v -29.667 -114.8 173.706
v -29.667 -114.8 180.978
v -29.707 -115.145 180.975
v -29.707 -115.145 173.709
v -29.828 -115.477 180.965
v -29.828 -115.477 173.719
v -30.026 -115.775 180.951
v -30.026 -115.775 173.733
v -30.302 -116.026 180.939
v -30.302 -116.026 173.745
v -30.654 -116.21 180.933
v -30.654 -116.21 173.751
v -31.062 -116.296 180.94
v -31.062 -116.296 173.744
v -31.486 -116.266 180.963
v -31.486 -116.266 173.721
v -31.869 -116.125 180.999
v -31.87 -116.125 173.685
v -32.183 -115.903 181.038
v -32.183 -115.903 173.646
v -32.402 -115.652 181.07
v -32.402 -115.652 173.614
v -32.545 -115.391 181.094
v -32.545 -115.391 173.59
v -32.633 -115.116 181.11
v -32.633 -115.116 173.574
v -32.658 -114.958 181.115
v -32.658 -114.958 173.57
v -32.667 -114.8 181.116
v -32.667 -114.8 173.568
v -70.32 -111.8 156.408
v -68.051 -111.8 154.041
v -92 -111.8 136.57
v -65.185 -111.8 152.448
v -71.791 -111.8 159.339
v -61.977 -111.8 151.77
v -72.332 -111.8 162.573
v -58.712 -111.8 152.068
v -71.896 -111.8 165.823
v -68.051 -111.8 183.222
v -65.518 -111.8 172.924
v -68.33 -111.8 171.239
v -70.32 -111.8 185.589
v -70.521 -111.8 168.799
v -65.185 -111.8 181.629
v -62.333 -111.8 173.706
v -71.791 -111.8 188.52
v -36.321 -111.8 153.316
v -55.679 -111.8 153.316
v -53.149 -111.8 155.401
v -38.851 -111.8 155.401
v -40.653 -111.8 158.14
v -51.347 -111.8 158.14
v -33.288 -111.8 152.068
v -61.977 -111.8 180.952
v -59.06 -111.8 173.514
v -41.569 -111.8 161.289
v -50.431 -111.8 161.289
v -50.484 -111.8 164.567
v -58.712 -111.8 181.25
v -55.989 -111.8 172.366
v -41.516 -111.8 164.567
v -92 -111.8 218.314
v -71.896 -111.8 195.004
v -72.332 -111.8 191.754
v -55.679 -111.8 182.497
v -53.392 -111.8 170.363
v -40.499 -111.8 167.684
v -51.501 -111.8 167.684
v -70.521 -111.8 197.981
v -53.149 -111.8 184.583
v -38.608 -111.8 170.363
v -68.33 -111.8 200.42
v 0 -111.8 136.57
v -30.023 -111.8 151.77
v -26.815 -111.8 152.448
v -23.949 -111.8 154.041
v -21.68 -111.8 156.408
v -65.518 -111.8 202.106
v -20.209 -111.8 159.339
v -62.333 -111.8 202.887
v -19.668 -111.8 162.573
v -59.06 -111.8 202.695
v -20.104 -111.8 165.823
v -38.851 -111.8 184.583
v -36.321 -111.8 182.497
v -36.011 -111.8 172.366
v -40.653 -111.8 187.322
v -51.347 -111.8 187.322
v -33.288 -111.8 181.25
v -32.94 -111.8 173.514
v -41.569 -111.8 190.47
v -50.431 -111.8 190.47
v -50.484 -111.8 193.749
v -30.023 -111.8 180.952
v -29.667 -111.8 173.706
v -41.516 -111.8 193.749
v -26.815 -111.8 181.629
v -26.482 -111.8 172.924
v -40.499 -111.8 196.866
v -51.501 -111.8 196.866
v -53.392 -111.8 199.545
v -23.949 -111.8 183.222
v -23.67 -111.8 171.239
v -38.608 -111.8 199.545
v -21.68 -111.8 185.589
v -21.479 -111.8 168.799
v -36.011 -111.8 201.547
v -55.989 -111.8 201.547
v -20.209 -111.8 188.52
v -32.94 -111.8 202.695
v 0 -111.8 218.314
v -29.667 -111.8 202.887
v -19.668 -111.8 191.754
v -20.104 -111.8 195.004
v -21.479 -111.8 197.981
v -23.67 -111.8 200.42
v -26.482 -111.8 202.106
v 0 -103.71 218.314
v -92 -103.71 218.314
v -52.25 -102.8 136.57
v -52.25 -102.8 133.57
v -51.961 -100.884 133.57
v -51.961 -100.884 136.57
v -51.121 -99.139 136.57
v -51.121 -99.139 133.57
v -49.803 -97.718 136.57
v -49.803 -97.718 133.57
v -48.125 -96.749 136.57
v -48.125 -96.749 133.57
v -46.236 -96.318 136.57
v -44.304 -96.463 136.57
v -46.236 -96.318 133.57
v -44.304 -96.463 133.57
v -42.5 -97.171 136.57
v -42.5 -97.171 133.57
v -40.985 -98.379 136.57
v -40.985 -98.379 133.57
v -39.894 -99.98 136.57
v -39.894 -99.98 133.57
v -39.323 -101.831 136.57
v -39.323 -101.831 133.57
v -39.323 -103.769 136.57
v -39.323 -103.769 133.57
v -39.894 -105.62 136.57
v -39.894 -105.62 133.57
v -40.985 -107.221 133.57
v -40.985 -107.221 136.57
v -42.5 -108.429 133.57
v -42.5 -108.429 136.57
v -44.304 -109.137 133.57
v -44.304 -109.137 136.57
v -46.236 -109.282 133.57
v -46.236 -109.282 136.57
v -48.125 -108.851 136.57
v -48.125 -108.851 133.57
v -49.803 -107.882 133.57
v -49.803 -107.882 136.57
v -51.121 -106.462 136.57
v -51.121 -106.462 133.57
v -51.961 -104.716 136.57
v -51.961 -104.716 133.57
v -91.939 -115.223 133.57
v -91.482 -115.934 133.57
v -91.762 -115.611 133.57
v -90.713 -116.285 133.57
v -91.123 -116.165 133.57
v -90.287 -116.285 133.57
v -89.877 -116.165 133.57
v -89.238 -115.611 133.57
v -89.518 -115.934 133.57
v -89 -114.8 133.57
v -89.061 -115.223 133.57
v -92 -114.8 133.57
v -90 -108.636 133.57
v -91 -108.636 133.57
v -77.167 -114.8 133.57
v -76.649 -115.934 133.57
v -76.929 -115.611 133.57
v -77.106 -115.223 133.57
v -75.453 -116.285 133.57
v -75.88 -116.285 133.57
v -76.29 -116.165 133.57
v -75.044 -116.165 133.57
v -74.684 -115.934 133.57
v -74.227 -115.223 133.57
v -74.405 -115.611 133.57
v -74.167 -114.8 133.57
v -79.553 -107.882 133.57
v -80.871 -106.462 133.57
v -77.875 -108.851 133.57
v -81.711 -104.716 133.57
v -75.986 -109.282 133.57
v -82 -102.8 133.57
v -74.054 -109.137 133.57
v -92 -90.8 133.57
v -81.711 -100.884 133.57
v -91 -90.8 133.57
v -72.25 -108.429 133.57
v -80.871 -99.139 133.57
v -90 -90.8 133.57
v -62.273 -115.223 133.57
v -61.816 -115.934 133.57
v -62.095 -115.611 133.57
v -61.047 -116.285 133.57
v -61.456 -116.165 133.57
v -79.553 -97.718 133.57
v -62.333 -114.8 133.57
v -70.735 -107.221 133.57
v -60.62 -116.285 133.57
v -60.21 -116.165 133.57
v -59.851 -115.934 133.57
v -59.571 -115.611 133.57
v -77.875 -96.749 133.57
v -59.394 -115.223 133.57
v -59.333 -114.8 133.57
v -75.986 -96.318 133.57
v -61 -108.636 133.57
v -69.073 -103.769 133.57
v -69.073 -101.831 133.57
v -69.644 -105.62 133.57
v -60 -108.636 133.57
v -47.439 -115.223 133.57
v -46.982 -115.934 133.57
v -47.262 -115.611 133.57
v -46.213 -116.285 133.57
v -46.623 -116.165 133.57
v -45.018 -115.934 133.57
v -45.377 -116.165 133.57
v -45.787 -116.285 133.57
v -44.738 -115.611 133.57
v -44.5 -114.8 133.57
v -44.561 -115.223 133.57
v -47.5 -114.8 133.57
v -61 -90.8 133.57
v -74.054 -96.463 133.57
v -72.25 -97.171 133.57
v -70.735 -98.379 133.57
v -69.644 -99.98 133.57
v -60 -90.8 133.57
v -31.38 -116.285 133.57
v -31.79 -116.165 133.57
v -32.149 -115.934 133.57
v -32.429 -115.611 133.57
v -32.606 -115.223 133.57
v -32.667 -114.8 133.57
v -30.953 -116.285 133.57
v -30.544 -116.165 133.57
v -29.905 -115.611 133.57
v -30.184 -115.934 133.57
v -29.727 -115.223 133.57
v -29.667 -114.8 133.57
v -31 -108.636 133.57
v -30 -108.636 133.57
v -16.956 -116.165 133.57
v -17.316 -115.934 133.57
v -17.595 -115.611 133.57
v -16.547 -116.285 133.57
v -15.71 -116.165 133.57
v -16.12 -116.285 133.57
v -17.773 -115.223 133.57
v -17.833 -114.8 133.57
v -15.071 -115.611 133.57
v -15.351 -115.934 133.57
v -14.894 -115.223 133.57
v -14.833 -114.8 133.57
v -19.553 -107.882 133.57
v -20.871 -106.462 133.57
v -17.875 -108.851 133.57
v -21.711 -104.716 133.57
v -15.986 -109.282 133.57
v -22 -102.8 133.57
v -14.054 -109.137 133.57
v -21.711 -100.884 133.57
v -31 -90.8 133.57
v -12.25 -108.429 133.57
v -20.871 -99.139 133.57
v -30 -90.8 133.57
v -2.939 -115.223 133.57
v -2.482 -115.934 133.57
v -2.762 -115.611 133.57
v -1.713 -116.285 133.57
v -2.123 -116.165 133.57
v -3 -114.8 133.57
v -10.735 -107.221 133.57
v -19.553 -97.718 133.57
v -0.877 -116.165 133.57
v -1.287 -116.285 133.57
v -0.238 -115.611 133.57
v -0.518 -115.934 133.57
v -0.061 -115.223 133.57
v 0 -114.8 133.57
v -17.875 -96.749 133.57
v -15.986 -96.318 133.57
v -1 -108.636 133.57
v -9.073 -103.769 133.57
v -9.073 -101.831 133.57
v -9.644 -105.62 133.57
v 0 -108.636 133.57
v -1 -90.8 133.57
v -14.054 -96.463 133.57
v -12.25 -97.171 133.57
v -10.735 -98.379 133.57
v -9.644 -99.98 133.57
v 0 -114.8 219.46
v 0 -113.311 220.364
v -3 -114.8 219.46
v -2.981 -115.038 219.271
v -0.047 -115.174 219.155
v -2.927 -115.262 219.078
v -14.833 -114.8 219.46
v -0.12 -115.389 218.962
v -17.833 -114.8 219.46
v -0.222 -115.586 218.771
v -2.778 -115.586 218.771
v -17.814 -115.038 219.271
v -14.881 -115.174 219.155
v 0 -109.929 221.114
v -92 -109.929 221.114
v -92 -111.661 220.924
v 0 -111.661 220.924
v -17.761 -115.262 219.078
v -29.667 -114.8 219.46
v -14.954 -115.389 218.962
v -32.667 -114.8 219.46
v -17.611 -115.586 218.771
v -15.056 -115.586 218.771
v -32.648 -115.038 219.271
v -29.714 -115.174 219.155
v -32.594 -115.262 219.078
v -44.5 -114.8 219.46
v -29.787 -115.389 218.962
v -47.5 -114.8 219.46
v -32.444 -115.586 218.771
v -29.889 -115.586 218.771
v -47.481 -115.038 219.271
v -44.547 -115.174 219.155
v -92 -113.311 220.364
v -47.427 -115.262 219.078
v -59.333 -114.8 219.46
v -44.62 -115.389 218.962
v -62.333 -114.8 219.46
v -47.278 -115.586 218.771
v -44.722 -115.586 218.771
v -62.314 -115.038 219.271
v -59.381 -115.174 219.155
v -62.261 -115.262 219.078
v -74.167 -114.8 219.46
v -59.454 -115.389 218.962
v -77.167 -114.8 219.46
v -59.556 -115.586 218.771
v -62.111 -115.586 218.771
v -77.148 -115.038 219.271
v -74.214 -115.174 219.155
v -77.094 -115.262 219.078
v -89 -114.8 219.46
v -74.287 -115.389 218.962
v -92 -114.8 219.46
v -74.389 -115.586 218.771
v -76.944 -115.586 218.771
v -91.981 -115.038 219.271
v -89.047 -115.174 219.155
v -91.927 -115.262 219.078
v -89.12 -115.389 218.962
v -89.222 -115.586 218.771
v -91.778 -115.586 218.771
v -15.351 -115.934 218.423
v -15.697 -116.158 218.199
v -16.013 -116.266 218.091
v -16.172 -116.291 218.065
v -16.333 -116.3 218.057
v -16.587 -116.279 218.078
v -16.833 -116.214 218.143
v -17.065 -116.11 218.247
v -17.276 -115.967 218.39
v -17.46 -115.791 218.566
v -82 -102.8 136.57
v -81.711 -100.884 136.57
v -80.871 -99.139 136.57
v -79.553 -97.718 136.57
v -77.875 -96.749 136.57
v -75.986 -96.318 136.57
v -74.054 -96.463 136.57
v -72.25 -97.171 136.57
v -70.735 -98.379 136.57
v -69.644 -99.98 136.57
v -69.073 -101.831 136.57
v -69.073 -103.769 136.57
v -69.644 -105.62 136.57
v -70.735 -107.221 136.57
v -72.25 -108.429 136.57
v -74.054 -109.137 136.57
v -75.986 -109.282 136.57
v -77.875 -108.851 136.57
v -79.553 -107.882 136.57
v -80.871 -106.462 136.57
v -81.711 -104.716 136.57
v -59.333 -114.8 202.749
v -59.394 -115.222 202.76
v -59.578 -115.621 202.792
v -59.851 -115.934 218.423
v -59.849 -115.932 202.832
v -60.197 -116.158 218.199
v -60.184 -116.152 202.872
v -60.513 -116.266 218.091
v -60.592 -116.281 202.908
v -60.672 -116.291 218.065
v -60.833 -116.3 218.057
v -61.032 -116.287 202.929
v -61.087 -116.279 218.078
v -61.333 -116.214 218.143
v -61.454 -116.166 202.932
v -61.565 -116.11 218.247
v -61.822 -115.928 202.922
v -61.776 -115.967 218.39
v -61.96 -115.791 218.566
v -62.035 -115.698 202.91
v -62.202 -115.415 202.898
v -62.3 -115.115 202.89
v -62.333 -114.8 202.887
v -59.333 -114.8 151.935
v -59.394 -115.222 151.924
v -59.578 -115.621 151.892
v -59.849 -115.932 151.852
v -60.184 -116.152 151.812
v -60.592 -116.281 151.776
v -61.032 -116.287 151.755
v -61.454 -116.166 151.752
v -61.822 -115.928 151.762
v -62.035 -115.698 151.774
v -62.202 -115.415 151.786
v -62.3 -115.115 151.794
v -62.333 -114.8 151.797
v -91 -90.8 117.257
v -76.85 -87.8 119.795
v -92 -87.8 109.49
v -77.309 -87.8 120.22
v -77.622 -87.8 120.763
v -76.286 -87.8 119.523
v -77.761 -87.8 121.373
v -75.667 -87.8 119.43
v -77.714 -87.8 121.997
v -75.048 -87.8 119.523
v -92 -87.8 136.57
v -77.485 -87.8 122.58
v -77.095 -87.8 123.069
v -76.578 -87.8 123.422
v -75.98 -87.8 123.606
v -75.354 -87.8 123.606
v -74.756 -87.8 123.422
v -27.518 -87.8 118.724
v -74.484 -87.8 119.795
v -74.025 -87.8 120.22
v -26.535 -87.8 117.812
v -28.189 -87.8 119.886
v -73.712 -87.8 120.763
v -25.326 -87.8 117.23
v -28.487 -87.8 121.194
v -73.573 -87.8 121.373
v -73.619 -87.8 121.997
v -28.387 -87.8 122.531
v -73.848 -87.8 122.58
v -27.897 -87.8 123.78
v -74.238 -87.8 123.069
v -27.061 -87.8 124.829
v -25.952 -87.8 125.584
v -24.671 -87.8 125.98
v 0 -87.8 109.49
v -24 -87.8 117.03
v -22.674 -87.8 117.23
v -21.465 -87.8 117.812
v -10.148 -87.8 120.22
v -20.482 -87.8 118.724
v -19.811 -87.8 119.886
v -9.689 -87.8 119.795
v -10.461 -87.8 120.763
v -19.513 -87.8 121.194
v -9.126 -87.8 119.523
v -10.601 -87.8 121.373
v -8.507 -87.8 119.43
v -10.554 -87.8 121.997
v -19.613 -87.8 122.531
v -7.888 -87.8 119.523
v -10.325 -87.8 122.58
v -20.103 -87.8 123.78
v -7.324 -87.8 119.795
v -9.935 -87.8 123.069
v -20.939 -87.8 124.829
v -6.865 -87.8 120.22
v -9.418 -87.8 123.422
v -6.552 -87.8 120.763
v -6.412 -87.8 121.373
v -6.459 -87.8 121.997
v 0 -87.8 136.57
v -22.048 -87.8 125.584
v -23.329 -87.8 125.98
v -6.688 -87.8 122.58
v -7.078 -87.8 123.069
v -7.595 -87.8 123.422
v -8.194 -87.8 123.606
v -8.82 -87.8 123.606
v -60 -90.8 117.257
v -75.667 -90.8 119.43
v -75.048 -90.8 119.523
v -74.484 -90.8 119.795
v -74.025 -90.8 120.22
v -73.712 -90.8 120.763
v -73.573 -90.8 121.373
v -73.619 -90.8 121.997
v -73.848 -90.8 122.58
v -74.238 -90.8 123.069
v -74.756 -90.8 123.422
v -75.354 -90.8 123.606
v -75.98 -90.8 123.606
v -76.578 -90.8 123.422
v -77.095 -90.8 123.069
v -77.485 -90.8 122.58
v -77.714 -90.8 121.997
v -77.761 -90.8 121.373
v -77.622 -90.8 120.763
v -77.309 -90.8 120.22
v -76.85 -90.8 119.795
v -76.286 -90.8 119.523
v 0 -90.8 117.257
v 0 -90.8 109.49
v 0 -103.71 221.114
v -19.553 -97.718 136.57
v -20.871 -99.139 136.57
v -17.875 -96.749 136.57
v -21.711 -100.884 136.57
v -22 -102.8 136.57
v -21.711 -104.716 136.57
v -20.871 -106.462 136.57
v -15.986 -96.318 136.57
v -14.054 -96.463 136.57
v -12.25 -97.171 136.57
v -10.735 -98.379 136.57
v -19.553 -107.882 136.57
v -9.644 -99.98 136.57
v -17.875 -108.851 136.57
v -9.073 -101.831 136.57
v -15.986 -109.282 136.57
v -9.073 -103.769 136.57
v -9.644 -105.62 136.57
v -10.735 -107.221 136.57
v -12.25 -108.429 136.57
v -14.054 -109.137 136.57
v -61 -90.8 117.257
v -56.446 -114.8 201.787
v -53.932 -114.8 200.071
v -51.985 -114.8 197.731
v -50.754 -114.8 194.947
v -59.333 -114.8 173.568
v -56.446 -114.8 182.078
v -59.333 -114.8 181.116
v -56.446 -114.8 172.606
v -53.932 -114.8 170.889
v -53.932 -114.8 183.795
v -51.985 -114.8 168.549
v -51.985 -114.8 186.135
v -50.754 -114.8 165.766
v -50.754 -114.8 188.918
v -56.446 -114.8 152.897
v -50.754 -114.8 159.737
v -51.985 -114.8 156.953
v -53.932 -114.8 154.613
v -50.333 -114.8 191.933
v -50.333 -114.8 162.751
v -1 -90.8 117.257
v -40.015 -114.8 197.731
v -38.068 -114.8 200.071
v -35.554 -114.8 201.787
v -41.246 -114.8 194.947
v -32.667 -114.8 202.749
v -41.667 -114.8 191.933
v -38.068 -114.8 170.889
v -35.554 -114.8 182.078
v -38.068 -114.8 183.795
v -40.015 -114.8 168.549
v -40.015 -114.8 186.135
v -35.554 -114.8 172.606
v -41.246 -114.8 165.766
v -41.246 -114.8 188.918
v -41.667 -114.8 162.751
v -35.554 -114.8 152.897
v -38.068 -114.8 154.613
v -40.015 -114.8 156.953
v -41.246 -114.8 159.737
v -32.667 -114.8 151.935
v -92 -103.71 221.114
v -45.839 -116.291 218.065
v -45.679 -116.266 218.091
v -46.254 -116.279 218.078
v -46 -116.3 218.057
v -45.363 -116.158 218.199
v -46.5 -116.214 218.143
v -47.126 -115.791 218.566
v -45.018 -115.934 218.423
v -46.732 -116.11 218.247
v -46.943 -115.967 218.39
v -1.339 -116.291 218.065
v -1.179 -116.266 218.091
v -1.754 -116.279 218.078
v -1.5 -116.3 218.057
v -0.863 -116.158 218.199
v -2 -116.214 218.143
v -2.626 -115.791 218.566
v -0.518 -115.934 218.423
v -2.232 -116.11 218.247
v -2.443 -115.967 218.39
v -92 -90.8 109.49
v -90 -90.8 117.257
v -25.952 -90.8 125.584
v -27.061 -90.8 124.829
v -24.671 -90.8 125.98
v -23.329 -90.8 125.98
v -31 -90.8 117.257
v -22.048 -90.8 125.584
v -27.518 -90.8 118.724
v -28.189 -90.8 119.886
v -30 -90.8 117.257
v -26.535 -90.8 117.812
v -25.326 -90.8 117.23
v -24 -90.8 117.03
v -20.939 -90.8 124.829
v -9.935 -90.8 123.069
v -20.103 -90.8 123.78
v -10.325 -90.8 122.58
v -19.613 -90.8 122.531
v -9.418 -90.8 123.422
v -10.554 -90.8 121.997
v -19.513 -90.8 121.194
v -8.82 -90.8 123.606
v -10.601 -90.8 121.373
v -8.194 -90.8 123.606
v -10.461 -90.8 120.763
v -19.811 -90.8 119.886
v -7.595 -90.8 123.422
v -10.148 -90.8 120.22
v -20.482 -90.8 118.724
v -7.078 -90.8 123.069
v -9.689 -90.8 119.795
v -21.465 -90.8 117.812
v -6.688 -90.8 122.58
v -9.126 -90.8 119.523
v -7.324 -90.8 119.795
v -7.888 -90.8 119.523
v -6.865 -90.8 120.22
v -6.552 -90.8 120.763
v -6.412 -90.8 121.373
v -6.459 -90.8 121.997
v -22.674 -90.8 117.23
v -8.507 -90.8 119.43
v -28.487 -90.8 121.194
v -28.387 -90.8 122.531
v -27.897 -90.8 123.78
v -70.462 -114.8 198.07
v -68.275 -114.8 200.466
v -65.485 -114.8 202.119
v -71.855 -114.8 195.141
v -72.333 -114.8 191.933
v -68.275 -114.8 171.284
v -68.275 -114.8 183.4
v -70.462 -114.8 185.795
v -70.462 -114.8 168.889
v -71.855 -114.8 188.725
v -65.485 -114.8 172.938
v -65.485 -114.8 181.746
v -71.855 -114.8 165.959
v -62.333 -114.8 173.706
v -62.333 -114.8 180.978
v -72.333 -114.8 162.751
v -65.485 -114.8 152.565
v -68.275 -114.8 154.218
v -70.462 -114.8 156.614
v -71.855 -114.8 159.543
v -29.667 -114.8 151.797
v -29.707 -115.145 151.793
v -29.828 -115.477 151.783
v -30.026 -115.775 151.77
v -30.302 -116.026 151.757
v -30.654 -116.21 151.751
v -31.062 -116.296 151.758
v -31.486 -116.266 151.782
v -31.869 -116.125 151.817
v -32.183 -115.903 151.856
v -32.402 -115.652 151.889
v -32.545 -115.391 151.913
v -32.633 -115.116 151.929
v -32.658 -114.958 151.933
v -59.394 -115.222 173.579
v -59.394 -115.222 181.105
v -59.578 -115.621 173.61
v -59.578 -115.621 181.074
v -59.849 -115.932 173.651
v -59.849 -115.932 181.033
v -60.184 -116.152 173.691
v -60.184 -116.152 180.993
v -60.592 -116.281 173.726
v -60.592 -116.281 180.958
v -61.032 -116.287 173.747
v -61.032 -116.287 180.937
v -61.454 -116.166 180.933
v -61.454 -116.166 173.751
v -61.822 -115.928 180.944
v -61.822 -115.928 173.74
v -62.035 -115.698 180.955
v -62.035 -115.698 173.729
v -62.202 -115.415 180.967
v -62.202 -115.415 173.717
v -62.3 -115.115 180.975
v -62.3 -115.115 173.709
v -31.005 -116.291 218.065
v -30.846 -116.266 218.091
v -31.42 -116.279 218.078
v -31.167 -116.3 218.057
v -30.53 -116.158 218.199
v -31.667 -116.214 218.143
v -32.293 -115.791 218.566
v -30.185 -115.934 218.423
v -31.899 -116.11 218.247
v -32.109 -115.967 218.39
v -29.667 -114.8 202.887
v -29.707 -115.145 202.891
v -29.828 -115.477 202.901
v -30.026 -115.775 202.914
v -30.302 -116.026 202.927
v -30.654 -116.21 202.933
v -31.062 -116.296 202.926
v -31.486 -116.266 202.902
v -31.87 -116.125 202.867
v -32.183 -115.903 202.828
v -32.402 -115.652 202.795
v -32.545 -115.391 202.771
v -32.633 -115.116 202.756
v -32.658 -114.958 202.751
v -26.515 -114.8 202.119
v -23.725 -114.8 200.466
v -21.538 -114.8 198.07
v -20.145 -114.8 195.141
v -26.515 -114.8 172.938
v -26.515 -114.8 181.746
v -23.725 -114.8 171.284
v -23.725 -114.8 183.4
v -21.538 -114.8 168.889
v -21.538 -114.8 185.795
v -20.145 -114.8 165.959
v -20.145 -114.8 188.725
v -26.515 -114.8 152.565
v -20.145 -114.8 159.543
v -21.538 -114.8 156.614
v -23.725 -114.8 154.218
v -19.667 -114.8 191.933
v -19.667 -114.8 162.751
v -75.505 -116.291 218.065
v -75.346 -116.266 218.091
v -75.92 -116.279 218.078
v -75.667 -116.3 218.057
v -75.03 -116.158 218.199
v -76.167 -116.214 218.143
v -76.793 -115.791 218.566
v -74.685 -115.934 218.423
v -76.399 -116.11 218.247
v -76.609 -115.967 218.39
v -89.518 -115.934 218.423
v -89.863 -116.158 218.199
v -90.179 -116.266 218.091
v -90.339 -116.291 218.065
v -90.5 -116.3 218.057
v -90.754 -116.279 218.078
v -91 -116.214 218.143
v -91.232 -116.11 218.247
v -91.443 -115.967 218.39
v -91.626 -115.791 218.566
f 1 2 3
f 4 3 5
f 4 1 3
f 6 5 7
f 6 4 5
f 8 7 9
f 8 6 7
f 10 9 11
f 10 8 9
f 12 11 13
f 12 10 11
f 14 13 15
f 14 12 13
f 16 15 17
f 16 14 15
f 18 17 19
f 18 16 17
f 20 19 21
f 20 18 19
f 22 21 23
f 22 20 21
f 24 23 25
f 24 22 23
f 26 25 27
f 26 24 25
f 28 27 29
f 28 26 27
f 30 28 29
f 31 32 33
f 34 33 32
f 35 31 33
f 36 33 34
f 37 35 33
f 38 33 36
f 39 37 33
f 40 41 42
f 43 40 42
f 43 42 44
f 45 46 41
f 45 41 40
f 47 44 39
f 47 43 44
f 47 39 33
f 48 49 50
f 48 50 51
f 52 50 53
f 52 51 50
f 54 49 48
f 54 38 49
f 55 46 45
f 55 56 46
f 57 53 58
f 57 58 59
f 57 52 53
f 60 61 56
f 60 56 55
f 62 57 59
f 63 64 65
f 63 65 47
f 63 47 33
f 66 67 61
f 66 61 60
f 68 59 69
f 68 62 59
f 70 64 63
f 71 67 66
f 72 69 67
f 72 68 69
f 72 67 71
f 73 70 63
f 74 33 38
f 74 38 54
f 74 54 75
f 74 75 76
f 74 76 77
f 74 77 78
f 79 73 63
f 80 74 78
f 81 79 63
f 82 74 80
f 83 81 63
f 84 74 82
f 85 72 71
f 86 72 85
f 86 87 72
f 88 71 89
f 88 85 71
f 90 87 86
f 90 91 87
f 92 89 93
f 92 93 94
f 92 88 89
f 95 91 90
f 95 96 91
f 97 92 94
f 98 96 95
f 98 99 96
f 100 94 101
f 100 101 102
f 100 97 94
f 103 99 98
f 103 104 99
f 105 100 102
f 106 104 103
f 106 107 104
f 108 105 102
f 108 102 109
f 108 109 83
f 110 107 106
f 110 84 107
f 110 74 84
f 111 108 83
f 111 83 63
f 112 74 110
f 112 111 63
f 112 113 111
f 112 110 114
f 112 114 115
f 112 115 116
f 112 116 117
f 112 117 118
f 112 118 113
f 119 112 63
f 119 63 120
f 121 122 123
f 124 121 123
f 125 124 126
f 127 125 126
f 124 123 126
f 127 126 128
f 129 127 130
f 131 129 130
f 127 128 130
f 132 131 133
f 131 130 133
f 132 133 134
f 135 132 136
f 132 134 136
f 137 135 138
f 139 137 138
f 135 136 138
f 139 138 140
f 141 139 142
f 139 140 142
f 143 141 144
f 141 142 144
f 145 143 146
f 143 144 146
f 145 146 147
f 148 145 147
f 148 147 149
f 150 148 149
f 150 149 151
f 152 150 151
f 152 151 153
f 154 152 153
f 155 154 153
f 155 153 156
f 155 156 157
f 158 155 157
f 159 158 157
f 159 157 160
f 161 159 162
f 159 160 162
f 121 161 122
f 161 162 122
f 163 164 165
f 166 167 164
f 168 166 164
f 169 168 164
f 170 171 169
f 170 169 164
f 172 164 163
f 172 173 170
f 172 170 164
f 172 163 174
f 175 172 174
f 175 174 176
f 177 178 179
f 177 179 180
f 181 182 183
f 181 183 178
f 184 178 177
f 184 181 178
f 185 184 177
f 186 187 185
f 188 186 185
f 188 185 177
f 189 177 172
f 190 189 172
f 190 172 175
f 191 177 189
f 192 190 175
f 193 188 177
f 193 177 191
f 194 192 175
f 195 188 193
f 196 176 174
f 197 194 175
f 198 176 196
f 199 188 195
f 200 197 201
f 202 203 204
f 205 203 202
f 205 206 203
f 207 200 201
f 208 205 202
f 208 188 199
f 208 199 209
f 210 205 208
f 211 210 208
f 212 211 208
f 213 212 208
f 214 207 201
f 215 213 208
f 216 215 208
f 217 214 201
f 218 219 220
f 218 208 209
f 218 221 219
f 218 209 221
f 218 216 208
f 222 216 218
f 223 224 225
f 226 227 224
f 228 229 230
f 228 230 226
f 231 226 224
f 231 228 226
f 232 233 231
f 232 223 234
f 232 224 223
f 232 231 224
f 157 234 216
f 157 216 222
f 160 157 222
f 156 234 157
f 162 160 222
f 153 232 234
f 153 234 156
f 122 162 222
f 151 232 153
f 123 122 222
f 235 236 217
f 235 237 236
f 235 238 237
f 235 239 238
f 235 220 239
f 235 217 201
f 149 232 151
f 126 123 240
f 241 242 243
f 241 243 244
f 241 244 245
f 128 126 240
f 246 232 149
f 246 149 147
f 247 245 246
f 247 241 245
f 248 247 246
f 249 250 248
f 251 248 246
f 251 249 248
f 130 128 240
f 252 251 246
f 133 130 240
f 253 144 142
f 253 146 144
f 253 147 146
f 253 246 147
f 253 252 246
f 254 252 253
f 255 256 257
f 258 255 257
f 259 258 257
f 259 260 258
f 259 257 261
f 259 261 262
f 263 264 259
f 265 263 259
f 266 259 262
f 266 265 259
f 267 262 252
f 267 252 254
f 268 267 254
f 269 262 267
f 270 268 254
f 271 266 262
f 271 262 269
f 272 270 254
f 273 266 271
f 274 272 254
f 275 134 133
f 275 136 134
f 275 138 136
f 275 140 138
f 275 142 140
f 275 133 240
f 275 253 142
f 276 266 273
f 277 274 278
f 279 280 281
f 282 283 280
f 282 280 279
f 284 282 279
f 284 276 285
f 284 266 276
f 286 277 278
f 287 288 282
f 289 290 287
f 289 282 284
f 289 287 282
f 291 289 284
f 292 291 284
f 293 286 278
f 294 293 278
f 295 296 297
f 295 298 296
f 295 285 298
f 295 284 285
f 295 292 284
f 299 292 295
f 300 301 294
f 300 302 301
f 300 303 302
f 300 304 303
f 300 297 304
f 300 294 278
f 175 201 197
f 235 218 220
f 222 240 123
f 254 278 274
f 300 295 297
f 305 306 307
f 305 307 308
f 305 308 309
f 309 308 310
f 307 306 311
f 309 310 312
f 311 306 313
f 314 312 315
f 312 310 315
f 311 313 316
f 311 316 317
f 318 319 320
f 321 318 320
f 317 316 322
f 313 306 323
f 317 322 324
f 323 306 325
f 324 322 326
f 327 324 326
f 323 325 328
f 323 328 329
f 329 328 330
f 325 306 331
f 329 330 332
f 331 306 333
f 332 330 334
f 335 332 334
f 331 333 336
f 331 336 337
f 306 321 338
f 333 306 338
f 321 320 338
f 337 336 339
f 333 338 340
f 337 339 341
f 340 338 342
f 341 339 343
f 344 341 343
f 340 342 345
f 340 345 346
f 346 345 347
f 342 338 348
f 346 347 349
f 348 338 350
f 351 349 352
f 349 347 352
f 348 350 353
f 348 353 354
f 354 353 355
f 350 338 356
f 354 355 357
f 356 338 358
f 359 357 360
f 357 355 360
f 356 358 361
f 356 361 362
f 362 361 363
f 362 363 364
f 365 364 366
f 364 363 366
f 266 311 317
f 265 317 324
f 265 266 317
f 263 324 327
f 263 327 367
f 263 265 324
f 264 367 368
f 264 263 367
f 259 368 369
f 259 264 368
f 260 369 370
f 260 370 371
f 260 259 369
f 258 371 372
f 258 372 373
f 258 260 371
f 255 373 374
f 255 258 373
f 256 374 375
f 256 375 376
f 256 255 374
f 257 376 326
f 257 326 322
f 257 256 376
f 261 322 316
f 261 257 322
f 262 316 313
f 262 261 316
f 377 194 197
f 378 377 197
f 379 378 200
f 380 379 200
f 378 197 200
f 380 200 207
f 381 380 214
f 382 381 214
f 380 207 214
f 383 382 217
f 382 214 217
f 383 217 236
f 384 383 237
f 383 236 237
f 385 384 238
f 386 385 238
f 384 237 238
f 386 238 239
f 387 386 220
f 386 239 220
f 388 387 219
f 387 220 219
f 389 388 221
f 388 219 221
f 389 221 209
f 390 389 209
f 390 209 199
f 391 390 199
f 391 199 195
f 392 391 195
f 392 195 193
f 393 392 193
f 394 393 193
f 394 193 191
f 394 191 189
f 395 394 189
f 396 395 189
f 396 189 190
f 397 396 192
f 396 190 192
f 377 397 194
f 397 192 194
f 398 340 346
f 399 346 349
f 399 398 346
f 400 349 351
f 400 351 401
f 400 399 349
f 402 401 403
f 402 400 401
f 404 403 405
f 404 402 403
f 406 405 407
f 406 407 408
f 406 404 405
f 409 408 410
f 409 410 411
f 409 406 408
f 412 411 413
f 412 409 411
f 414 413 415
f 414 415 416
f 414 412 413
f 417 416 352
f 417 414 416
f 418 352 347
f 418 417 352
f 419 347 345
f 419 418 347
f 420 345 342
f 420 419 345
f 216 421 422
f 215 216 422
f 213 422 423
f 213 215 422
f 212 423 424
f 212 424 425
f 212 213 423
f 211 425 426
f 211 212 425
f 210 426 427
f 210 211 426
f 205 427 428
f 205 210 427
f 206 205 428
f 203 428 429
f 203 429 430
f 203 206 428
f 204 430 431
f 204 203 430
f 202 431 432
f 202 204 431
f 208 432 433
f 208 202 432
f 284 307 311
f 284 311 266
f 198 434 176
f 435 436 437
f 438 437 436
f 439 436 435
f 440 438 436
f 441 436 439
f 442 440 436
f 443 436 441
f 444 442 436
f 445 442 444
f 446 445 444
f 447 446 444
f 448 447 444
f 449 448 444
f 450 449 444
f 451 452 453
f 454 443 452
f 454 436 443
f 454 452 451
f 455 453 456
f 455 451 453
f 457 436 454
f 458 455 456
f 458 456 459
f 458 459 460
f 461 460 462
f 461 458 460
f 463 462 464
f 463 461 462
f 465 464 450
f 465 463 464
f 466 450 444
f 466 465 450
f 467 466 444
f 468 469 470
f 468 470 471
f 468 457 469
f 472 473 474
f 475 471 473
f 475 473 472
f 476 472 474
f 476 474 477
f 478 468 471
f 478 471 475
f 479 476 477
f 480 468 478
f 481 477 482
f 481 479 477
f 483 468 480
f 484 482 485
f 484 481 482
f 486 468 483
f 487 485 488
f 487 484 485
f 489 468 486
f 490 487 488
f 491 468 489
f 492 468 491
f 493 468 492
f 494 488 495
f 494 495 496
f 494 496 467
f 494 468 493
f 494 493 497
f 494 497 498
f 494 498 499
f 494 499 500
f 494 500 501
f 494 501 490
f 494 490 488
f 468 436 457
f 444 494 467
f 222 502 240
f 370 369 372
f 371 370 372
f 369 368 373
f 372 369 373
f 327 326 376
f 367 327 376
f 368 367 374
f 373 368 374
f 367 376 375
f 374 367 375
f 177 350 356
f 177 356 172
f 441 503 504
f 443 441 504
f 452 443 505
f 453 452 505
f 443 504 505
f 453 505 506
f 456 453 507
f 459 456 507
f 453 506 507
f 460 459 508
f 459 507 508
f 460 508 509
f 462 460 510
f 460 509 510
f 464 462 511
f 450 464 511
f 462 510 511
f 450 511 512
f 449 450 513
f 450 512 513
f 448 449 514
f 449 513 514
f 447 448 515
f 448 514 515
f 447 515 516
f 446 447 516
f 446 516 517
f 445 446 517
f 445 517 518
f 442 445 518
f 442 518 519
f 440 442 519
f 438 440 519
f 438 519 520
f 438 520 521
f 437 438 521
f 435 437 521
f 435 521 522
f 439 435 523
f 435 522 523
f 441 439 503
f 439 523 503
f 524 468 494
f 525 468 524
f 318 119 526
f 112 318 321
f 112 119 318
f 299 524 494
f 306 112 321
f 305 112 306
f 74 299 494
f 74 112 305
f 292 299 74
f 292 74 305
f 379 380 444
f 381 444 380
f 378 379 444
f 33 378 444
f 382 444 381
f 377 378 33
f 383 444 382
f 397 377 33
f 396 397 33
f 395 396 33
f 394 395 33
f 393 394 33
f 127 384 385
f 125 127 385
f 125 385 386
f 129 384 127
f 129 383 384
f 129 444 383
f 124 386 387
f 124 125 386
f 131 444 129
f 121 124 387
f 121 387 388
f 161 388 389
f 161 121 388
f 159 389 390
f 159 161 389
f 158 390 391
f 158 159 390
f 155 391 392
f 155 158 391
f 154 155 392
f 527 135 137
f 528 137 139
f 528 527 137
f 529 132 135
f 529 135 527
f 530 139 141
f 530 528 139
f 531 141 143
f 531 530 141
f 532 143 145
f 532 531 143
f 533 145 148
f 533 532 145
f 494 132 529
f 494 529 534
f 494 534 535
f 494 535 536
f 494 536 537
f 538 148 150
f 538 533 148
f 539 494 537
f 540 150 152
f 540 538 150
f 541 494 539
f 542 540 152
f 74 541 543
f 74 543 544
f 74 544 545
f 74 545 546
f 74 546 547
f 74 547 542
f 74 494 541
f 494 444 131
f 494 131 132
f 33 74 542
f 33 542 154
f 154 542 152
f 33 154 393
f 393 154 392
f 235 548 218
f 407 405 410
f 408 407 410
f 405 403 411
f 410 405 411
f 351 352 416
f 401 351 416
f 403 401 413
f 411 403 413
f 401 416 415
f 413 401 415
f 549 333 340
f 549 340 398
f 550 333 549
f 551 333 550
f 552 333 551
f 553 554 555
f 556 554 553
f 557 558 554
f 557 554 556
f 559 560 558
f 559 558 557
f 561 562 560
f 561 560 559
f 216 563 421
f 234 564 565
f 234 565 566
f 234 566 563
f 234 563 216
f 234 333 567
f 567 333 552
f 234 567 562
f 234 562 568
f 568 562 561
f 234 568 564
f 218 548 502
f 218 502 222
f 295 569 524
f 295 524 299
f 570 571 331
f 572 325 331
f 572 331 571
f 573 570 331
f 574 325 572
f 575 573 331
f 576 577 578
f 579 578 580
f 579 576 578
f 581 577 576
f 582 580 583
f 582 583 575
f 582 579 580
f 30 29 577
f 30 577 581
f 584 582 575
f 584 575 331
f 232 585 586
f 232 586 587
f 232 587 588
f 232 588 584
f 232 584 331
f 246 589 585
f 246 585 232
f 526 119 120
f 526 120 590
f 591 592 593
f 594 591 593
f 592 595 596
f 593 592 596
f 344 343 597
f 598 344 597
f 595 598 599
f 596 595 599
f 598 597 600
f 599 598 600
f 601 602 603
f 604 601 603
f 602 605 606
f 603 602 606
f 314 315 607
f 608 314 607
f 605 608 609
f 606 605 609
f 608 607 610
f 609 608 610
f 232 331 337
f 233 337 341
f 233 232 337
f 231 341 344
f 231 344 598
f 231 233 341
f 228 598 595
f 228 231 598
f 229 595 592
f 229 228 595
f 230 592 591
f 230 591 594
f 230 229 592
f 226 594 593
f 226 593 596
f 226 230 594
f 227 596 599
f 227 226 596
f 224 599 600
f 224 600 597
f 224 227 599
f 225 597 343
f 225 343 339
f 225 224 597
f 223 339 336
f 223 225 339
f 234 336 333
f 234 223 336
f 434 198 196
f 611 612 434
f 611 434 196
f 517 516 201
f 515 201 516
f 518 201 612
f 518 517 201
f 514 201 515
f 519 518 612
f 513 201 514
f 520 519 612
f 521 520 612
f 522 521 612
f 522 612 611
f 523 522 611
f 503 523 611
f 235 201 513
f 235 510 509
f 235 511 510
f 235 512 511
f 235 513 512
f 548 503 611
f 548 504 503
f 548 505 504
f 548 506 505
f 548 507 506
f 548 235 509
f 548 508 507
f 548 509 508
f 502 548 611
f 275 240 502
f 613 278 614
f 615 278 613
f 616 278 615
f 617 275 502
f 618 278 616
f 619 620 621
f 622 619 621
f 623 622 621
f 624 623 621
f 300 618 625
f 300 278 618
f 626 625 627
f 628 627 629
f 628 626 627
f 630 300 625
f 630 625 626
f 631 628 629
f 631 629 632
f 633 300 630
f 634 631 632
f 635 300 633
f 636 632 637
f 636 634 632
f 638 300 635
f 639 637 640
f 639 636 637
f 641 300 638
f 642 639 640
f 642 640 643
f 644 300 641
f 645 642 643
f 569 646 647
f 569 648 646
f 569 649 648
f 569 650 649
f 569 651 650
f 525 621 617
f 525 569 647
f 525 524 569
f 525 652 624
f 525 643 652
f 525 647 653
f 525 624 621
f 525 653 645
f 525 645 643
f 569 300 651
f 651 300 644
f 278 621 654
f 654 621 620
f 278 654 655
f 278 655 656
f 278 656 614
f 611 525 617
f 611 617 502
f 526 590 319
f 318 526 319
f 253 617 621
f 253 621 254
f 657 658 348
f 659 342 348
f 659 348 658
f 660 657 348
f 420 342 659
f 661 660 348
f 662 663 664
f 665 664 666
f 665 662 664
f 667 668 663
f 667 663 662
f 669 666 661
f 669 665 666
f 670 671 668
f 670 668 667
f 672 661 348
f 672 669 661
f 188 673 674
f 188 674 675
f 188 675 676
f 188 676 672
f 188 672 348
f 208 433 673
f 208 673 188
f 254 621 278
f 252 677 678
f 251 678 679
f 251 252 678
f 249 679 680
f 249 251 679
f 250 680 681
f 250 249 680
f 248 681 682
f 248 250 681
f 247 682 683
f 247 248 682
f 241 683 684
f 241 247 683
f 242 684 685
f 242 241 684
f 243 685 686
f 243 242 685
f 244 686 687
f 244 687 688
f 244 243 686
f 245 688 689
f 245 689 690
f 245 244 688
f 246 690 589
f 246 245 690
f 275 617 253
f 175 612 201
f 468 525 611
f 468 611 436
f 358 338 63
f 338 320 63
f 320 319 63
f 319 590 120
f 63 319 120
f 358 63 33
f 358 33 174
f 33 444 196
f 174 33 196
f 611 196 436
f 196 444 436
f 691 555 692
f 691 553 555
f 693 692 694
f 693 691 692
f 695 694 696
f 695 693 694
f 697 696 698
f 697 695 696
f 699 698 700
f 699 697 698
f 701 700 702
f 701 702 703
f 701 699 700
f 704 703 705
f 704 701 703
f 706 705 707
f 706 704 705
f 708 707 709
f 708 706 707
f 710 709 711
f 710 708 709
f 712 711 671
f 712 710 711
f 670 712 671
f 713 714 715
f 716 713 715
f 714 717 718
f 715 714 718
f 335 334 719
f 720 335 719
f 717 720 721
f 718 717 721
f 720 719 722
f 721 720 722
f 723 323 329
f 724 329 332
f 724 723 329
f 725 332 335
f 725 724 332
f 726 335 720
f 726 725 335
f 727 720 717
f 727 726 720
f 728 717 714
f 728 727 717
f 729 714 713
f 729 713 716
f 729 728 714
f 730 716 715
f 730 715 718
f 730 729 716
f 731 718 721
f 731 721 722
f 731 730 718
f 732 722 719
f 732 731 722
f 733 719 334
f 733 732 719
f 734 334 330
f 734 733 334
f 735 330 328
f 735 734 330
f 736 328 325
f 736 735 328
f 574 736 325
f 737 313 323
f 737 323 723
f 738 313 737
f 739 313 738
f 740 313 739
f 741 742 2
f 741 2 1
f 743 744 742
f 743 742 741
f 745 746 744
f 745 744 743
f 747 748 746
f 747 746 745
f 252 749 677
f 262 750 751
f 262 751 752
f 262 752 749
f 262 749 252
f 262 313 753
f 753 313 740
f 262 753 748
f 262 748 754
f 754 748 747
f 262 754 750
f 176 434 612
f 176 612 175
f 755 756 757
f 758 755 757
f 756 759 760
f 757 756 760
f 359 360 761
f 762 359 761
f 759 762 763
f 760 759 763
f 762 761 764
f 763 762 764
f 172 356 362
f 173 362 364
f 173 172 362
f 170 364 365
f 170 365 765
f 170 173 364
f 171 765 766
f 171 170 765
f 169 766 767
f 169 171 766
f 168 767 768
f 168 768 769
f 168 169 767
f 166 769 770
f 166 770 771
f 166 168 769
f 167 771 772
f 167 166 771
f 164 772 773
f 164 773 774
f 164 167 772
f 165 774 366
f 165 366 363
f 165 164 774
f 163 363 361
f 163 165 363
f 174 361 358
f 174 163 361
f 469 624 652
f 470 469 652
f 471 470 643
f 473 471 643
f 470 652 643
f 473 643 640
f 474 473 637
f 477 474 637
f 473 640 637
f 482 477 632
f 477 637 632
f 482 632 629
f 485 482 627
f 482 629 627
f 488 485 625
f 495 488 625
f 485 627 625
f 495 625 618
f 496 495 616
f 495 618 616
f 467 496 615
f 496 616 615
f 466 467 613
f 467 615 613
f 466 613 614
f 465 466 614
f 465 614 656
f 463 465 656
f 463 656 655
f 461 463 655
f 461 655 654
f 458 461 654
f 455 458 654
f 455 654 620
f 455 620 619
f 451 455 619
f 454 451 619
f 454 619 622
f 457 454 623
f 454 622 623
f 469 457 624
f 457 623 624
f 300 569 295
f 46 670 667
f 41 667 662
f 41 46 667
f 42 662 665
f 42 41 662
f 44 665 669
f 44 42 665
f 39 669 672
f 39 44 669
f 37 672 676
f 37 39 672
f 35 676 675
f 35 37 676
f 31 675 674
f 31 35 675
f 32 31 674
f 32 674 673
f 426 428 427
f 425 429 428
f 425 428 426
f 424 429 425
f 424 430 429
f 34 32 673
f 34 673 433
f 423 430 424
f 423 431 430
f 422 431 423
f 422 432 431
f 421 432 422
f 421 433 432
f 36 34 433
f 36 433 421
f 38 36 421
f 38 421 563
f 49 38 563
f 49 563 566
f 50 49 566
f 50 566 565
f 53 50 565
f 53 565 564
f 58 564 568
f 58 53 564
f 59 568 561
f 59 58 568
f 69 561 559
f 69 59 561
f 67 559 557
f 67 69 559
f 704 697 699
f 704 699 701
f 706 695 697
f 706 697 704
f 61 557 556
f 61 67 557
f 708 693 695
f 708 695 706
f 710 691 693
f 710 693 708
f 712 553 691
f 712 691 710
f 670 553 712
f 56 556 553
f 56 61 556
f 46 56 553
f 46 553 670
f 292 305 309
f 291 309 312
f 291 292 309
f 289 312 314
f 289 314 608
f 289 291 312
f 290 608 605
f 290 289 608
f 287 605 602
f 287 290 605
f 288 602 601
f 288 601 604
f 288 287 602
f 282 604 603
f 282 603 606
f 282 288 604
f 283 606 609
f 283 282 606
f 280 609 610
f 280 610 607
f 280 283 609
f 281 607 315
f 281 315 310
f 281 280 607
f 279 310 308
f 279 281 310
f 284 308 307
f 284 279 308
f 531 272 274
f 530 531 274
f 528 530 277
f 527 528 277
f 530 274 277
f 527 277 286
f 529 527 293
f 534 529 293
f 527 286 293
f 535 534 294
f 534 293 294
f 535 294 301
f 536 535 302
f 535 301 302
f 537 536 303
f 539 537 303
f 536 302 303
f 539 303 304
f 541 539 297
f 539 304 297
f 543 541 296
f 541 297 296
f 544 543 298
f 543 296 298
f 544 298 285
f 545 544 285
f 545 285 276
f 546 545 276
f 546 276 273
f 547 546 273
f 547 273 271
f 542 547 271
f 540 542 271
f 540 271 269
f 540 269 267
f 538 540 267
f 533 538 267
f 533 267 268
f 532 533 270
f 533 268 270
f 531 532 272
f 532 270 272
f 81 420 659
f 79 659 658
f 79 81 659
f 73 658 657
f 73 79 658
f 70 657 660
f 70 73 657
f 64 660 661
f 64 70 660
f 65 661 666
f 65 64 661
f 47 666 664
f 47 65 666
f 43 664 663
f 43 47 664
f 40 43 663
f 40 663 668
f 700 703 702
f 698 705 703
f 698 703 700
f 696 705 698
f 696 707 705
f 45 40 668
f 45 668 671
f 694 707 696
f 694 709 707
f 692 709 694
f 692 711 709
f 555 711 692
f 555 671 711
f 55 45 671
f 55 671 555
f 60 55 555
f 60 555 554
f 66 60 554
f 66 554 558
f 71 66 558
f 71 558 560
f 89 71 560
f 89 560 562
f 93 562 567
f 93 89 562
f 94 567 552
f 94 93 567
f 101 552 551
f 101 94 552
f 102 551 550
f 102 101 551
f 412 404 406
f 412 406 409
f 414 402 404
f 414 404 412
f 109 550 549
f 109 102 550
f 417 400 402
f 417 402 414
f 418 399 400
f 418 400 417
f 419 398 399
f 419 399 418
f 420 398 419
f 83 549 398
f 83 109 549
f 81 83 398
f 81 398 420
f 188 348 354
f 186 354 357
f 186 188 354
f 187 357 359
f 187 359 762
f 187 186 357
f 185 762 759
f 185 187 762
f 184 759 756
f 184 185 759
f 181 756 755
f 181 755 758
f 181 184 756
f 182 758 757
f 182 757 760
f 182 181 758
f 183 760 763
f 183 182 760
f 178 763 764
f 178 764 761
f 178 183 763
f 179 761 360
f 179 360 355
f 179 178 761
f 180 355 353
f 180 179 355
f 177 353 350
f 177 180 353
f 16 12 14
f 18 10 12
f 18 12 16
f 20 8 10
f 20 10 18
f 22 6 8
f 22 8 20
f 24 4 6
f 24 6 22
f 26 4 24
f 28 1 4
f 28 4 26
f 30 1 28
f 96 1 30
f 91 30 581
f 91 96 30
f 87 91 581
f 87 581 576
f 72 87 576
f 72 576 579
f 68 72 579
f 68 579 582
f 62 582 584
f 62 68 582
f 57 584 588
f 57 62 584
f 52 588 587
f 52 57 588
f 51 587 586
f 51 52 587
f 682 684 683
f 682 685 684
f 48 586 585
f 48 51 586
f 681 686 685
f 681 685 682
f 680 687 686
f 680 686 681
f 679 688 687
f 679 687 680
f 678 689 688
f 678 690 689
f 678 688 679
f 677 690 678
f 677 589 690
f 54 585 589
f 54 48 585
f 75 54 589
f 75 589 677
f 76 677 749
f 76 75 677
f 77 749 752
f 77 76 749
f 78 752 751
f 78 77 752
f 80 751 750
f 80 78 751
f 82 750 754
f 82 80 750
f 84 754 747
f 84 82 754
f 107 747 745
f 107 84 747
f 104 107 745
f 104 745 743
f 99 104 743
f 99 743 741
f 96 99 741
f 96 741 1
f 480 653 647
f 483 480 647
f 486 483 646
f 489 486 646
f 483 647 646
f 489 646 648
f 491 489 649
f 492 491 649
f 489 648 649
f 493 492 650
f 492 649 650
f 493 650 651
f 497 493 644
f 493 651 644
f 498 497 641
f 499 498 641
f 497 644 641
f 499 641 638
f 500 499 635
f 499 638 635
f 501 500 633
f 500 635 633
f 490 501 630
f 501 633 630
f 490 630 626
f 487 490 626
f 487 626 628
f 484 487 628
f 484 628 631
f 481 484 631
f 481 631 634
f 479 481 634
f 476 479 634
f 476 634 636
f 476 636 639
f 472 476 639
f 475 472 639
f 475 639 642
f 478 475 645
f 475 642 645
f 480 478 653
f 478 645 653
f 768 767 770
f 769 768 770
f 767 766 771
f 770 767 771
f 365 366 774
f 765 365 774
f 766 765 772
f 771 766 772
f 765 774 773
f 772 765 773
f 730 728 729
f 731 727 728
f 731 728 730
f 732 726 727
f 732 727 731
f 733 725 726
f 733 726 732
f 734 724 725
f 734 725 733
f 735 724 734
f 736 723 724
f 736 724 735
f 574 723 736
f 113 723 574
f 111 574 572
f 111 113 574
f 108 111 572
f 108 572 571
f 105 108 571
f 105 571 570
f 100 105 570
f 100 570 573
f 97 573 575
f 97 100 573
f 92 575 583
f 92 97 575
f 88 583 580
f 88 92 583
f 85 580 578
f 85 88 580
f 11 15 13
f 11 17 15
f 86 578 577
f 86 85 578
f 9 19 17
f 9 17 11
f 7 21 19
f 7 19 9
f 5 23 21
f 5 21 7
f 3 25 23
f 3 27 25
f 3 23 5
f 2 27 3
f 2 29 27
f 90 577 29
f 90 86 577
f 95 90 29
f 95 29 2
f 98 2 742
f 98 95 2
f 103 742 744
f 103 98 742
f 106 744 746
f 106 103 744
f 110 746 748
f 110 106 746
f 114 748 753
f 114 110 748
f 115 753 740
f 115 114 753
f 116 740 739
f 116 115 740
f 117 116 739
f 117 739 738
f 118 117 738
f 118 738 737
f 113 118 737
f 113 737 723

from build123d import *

# Parameters (mm, degrees)
BOSS_EXTRU_1_DEPTH           = 92
NERVURE2_REACH               = 267.583
ESQUISSE3_WALL_W             = 557.337159988
ESQUISSE3_WALL_H             = 1
R_P_TITION_LIN_AIRE1_COUNT   = 4
R_P_TITION_LIN_AIRE1_PITCH   = 30
ESQUISSE4_R                  = 6.5
ENL_V_MAT_EXTRU_1_DEPTH      = 3
ESQUISSE6_R                  = 1.5
BOSS_EXTRU_2_DEPTH           = 87.544216856
R_P_TITION_LIN_AIRE2_COUNT   = 7
R_P_TITION_LIN_AIRE2_PITCH   = 14.833333333
ENL_V_MAT_EXTRU_2_DEPTH      = 3
ENL_V_MAT_EXTRU_2_DEPTH_BACK = 3
ESQUISSE5_R                  = 11
ENL_V_START                  = -92
ENL_V_MAT_EXTRU_3_DEPTH      = 92
CONG_1_R                     = 8
ESQUISSE9_R                  = 4.5
ENL_V_MAT_EXTRU_5_DEPTH      = 3
ESQUISSE8_R                  = 2.1
ENL_V_MAT_EXTRU_4_DEPTH      = 3


with BuildPart() as part:
    # Esquisse1 → Boss.-Extru.1 (new body)
    with BuildSketch(Plane(origin=(0, 0, 0), x_dir=(0, 0, -1), z_dir=(1, 0, 0))):
        Polygon((-109.489716306, -87.800176517), (-136.569905432, -87.800176517), (-136.569905432, -111.800176517), (-218.114122288, -111.800176517), (-218.314122288, -111.800176517), (-218.314122288, -103.710391053), (-221.114122288, -103.710391053), (-221.114122288, -114.800176517), (-133.569905432, -114.800176517), (-133.569905432, -90.800176517), (-109.489716306, -90.800176517), align=None)
    extrude(amount=-BOSS_EXTRU_1_DEPTH)

    # Esquisse3 wall → Nervure2 (add, up to next)
    with BuildSketch(Plane(origin=(0, -99.717919792, 125.413574296), x_dir=(0, -0.737906584765, 0.674902861278), z_dir=(0, -0.674902861278, -0.737906584765)), mode=Mode.PRIVATE) as nervure2_sk1:
        with Locations((0, 0.5)):
            Rectangle(ESQUISSE3_WALL_W, ESQUISSE3_WALL_H)
    nervure2_tool1 = extrude(nervure2_sk1.sketch, amount=-NERVURE2_REACH, mode=Mode.PRIVATE) - part.part
    nervure2 = nervure2_tool1.solids().sort_by_distance((0, -99.717919792, 125.413574296))[0]
    add(nervure2)

    # Répétition linéaire1: Nervure2 ×4
    with Locations(*[(-i * R_P_TITION_LIN_AIRE1_PITCH, 0, 0) for i in range(1, R_P_TITION_LIN_AIRE1_COUNT)]):
        add(nervure2)

    # Esquisse4 → Enlèv. mat.-Extru.1 (cut)
    with BuildSketch(Plane(origin=(0, 0, 133.569905432), x_dir=(-1, 0, 0), z_dir=(0, 0, -1))):
        with Locations((15.5, -102.800176517)):
            Circle(ESQUISSE4_R)
        with Locations((45.75, -102.800176517)):
            Circle(ESQUISSE4_R)
        with Locations((75.5, -102.800176517)):
            Circle(ESQUISSE4_R)
    extrude(amount=-ENL_V_MAT_EXTRU_1_DEPTH, mode=Mode.SUBTRACT)

    # Esquisse6 → Boss.-Extru.2 (add)
    with BuildSketch(Plane(origin=(0, 0, 133.569905432), x_dir=(-1, 0, 0), z_dir=(0, 0, -1))):
        with Locations((1.5, -114.800176517)):
            Circle(ESQUISSE6_R)
    boss_extru_2 = extrude(amount=-BOSS_EXTRU_2_DEPTH)

    # Répétition linéaire2: Boss.-Extru.2 ×7
    with Locations(*[(-i * R_P_TITION_LIN_AIRE2_PITCH, 0, 0) for i in range(1, R_P_TITION_LIN_AIRE2_COUNT)]):
        add(boss_extru_2)

    # Esquisse5 → Enlèv. mat.-Extru.2 (cut, two sides: drawn at the far end of the back side and taken through both)
    with BuildSketch(Plane(origin=(0, -114.800176517, 0), x_dir=(-1, 0, 0), z_dir=(0, -1, 0)).offset(-ENL_V_MAT_EXTRU_2_DEPTH_BACK)):
        with Locations(Location((30.666666667, -162.751311051, 0), (0, 0, 264.78409143))):
            Circle(ESQUISSE5_R)
        with Locations(Location((61.333333333, -162.751311051, 0), (0, 0, 275.21590857))):
            Circle(ESQUISSE5_R)
        with Locations(Location((61.333333333, -191.93271667, 0), (0, 0, 275.21590857))):
            Circle(ESQUISSE5_R)
        with Locations(Location((30.666666667, -191.93271667, 0), (0, 0, 264.78409143))):
            Circle(ESQUISSE5_R)
    extrude(amount=ENL_V_MAT_EXTRU_2_DEPTH + ENL_V_MAT_EXTRU_2_DEPTH_BACK, mode=Mode.SUBTRACT)

    # Esquisse7 → Enlèv. mat.-Extru.3 (cut)
    with BuildSketch(Plane(origin=(0, 0, 0), x_dir=(0, 0, -1), z_dir=(1, 0, 0)).offset(ENL_V_START)):
        Polygon((-221.114122288, -113.242817204), (-218.056762976, -116.300176517), (-221.114122288, -116.300176517), align=None)
    extrude(amount=ENL_V_MAT_EXTRU_3_DEPTH, mode=Mode.SUBTRACT)

    # Congé1
    # the kernel refuses this fillet: 8 mm, written as the material it takes off along each edge
    with BuildSketch(Plane(origin=(-100.284271247, -113.242817204, 221.114122288), x_dir=(0, -0.7071067811865497, -0.7071067811865454), z_dir=(1, 0, 0))) as cong_1_piece_1:
        with BuildLine():
            CenterArc((CONG_1_R * 0.414213562373, CONG_1_R), CONG_1_R, 225, 45)
            Line((-CONG_1_R * 0.292893218813, CONG_1_R * 0.292893218813), (0, 0))
            Line((0, 0), (CONG_1_R * 0.414213562373, 0))
        make_face()
    extrude(amount=108.568542495, mode=Mode.SUBTRACT)

    # Esquisse9 → Enlèv. mat.-Extru.5 (cut)
    with BuildSketch(Plane.XZ.offset(90.800176517)):
        with Locations(Location((-24, 121.529810869, 0), (0, 0, 270))):
            Circle(ESQUISSE9_R)
    extrude(amount=-ENL_V_MAT_EXTRU_5_DEPTH, mode=Mode.SUBTRACT)

    # Esquisse8 → Enlèv. mat.-Extru.4 (cut)
    with BuildSketch(Plane.XZ.offset(90.800176517)):
        with Locations(Location((-8.506517848, 121.529810869, 0), (0, 0, 270))):
            Circle(ESQUISSE8_R)
        with Locations(Location((-75.666666667, 121.529810869, 0), (0, 0, 270))):
            Circle(ESQUISSE8_R)
    extrude(amount=-ENL_V_MAT_EXTRU_4_DEPTH, mode=Mode.SUBTRACT)


solid = part.part
